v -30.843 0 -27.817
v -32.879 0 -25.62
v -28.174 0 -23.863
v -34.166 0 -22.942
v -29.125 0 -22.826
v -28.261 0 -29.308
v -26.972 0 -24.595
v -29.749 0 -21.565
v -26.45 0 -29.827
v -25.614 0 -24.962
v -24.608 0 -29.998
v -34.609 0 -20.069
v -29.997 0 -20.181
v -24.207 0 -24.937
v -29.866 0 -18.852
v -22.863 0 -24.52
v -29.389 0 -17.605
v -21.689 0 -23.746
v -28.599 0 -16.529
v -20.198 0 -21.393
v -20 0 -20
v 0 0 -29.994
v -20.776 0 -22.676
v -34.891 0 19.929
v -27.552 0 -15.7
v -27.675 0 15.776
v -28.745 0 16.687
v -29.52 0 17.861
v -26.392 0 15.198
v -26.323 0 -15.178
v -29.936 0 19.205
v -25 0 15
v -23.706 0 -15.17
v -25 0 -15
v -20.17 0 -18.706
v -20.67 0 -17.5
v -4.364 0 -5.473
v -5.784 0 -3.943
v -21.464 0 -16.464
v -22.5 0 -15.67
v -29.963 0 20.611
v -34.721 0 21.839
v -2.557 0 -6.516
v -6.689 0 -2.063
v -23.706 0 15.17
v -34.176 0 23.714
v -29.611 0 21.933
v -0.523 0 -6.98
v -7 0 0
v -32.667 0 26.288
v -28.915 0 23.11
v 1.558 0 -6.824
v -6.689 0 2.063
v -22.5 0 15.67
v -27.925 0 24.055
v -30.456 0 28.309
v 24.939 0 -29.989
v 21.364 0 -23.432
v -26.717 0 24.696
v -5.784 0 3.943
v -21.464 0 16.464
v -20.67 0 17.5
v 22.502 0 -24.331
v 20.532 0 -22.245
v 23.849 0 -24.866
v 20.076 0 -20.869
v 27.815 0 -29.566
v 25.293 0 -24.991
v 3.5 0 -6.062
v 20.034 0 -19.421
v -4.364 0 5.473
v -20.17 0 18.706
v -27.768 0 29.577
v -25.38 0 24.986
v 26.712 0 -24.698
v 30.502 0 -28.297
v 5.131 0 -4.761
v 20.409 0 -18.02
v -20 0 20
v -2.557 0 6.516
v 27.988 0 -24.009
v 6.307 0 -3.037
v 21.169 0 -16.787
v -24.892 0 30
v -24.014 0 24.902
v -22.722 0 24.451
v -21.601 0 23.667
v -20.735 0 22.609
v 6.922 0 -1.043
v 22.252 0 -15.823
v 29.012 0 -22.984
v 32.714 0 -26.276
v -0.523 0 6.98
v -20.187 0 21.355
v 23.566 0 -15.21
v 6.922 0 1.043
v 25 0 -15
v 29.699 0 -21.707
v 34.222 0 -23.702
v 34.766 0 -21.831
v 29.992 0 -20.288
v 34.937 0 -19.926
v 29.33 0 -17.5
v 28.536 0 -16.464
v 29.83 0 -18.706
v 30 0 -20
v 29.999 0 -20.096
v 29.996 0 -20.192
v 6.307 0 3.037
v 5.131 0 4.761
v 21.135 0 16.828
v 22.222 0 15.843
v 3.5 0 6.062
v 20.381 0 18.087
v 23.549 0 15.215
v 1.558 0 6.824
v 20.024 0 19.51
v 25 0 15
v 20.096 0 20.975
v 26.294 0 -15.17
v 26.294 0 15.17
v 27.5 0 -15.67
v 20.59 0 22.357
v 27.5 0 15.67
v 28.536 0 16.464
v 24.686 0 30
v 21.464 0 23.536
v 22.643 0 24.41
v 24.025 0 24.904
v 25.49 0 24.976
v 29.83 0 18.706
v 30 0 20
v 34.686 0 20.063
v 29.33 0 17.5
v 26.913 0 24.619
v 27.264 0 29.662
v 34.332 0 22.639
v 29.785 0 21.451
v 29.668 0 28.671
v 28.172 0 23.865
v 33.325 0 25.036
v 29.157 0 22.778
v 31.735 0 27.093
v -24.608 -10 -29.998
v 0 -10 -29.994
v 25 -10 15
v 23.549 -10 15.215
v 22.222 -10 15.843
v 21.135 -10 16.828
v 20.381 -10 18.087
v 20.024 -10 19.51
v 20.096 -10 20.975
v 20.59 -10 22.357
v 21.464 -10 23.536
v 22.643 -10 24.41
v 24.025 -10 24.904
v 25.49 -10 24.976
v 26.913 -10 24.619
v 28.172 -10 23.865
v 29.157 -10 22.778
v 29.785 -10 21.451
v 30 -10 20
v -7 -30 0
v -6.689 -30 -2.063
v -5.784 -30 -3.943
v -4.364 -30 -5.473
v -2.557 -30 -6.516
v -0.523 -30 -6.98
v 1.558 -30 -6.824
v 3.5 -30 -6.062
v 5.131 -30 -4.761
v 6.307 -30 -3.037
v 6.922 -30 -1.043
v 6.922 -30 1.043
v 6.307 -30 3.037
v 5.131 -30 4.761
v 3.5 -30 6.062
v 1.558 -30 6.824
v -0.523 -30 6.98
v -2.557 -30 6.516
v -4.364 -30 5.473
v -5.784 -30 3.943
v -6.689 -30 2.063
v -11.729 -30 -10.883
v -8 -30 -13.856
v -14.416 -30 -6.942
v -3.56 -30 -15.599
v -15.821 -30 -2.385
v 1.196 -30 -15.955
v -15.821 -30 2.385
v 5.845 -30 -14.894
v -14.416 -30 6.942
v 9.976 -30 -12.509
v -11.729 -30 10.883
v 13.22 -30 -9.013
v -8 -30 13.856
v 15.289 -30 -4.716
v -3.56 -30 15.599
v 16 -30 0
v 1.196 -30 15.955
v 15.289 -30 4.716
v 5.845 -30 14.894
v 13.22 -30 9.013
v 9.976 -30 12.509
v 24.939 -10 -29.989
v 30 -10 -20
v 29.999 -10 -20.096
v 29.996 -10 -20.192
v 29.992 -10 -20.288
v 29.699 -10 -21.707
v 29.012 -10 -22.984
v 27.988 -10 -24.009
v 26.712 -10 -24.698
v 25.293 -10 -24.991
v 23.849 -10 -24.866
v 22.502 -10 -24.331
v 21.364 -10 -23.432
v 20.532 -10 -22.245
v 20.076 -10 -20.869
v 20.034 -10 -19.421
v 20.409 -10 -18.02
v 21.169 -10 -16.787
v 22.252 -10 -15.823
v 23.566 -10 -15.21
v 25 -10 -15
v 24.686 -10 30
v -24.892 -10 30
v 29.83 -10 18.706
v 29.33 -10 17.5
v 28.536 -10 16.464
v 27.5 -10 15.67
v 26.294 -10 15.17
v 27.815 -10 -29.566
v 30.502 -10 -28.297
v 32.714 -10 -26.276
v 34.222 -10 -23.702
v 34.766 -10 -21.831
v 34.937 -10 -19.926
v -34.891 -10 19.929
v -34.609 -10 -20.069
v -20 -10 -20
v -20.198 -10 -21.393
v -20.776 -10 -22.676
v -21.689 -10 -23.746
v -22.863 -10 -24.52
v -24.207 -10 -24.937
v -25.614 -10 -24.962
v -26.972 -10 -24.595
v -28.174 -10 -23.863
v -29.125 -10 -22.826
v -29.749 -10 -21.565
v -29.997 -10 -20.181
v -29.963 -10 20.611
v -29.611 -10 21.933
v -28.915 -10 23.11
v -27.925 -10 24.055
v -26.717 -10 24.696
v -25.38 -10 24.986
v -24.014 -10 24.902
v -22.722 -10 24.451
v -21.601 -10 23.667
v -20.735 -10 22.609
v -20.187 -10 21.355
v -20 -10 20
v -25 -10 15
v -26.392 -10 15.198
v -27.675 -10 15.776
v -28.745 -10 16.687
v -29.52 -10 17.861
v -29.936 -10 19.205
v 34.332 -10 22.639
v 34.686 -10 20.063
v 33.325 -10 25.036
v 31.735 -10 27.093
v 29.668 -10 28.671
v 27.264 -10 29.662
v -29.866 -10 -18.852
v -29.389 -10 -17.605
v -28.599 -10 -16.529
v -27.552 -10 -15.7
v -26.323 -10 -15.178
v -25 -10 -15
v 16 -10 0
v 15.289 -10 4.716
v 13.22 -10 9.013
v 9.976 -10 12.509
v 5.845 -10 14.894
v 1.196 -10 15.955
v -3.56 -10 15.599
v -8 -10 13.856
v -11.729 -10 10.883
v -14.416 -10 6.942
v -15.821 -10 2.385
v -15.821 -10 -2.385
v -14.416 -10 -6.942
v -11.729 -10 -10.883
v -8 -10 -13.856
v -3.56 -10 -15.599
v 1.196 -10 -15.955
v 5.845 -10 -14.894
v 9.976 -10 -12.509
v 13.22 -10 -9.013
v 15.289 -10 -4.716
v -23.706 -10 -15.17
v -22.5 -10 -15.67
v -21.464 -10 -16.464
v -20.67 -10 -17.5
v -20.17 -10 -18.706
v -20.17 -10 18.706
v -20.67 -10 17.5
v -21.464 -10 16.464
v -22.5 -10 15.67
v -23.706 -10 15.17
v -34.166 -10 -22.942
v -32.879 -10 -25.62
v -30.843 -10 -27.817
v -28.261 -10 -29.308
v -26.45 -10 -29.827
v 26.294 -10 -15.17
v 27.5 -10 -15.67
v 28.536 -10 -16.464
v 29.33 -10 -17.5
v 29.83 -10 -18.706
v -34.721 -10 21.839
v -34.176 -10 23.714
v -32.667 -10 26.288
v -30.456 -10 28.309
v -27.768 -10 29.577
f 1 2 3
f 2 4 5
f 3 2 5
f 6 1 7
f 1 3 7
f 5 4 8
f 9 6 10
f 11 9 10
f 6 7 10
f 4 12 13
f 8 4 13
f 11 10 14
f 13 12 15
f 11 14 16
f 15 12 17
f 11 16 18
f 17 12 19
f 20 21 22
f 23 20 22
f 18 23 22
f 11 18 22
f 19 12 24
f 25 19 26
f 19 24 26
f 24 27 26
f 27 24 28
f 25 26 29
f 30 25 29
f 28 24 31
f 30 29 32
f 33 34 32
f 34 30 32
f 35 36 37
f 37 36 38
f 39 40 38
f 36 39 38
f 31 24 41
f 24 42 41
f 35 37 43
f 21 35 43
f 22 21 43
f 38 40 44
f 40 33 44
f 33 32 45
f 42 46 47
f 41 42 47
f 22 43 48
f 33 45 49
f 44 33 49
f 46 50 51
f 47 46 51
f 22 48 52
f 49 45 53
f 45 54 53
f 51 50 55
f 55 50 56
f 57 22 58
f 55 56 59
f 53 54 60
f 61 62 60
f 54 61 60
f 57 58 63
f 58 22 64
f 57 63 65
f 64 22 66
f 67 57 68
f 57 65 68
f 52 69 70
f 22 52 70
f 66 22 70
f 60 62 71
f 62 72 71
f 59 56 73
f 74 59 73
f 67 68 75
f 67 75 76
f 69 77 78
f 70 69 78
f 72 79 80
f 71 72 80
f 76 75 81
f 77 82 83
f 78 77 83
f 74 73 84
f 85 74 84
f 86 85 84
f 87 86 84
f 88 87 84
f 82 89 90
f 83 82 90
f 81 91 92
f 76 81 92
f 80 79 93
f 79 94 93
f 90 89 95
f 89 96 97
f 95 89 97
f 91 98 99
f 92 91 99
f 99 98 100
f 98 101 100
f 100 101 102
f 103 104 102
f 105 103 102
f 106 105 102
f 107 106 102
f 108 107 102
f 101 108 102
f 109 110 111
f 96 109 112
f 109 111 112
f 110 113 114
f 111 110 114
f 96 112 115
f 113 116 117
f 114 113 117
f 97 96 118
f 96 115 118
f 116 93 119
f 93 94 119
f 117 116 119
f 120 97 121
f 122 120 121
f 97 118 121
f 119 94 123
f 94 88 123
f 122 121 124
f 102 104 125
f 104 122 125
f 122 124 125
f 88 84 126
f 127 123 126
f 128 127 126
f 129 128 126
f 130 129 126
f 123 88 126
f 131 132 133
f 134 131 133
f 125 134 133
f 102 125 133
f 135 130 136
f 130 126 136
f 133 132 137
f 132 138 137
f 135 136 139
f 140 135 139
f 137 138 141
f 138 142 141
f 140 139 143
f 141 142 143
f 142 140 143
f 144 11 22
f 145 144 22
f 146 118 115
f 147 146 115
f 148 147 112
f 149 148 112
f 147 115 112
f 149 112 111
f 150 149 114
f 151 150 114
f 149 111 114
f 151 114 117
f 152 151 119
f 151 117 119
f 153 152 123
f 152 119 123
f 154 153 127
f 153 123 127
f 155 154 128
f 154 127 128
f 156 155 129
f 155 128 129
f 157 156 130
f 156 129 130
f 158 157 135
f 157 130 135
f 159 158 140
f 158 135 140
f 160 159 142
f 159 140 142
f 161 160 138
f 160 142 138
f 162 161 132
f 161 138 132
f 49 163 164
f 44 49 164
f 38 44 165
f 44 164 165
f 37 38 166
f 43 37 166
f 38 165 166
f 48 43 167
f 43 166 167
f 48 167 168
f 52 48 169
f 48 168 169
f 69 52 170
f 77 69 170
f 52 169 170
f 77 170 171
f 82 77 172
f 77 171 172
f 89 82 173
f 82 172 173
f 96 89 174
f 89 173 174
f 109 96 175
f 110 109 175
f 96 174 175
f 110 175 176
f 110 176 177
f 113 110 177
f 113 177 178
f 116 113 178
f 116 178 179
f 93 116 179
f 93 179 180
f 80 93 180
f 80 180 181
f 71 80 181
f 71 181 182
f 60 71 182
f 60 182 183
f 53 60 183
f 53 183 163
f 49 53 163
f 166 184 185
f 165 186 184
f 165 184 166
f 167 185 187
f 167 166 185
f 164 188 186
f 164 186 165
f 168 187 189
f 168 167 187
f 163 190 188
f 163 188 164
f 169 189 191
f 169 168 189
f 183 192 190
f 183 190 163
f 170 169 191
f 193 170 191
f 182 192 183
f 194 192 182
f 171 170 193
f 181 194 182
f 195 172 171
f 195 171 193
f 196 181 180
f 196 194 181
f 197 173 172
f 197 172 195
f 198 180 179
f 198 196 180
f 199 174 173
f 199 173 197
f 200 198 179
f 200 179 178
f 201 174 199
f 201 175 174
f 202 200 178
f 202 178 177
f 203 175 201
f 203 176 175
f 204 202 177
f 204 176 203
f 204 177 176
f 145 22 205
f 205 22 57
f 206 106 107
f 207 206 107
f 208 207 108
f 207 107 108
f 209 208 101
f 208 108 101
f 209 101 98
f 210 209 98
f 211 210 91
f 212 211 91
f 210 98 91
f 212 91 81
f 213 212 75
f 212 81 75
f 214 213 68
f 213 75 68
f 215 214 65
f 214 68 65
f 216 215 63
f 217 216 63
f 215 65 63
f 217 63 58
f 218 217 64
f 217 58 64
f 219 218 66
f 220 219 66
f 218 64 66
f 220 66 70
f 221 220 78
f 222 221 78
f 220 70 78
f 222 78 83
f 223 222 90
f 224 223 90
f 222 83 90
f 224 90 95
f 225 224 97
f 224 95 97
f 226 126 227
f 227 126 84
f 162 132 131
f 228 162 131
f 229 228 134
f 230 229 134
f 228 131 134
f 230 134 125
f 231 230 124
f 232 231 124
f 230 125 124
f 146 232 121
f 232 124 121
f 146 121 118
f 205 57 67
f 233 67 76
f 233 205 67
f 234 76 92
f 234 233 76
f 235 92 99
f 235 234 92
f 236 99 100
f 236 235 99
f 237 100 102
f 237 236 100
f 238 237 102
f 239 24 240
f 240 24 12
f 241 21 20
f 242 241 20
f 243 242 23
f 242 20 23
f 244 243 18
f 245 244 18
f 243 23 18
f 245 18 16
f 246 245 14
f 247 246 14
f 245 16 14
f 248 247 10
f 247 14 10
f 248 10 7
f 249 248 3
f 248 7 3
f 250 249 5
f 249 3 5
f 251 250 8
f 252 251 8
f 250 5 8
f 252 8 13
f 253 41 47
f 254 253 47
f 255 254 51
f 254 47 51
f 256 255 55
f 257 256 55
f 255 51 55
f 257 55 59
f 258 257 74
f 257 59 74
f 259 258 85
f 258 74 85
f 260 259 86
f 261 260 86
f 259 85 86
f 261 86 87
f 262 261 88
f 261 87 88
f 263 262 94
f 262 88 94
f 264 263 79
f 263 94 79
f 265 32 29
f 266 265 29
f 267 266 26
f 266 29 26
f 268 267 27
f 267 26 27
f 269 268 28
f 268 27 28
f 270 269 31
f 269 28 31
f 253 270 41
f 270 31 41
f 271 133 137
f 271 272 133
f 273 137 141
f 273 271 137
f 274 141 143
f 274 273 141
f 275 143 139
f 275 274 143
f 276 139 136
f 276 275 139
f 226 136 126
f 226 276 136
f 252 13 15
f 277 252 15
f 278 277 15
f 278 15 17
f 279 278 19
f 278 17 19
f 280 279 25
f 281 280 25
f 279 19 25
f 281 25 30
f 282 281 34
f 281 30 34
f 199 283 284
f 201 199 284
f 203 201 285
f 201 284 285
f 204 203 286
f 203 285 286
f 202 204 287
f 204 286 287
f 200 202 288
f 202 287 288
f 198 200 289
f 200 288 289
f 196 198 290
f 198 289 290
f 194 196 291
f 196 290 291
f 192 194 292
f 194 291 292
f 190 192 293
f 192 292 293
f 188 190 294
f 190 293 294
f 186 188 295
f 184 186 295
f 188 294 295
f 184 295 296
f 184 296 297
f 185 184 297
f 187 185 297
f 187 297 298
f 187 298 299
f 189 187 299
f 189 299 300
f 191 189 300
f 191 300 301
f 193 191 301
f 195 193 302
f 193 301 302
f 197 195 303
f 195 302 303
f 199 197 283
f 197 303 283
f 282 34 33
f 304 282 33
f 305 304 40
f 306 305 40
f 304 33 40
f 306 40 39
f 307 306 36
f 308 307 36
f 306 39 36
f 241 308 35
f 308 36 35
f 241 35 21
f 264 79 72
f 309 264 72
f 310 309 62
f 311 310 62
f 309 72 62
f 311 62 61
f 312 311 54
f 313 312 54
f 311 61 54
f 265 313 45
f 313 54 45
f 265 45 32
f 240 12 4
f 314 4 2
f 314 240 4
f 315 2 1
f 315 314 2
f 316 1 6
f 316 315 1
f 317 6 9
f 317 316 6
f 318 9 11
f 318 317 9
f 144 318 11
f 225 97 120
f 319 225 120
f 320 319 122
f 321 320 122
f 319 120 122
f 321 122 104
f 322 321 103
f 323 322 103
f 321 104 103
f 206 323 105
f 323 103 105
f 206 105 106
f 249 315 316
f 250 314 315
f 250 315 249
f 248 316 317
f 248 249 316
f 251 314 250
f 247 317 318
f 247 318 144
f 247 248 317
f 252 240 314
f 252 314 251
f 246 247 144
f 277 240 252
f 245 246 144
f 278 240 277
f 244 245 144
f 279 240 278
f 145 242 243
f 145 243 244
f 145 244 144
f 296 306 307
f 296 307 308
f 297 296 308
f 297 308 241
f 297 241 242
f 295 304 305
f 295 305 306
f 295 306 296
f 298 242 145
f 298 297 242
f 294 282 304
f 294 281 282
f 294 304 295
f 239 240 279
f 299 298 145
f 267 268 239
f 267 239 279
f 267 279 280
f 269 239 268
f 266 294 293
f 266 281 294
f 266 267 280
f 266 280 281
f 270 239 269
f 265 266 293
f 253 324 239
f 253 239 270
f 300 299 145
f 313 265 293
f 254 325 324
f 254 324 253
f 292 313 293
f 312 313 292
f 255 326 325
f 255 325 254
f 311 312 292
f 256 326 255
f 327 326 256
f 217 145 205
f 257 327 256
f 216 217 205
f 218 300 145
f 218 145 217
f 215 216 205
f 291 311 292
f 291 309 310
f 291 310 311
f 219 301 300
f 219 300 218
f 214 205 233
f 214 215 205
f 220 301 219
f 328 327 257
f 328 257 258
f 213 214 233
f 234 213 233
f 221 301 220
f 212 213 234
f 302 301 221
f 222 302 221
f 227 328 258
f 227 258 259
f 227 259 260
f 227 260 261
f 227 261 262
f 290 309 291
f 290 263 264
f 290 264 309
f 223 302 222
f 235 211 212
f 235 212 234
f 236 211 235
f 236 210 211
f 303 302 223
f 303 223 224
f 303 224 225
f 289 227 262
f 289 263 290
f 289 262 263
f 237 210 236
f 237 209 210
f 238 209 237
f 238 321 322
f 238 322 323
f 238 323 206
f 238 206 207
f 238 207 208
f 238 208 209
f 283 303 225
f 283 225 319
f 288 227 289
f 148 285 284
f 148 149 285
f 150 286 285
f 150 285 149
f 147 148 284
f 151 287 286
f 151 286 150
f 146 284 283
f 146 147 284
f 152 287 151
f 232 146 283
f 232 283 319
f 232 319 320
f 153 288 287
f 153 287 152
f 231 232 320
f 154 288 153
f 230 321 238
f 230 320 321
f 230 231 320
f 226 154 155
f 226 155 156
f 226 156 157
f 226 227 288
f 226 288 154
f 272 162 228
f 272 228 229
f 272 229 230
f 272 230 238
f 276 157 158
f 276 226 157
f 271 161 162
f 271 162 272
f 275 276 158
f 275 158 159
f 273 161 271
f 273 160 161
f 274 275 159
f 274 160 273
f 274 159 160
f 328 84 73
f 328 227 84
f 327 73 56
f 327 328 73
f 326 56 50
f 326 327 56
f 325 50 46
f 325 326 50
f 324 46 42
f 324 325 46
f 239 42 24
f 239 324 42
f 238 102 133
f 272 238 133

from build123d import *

# Parameters (mm, degrees)
F1_DEPTH = 10
F2_R     = 10
F3_R     = 16
F4_DEPTH = 20
F5_D     = 14
F5_DEPTH = 31
F5_TIP   = 4.2060243332


with BuildPart() as f1:
    # F0 (on Front) → F1 (new body)
    with BuildSketch(Plane.XZ):
        with BuildLine():
            ThreePointArc((-16, 0), (-11.313708499, 11.313708499), (0, 16))
            Line((0, 16), (0, 30))
            Line((0, 30), (-34.9625474322, 30))
            Line((-34.9625474322, 30), (-34.8962779592, 20.6108379355))
            Line((-34.8962779592, 20.6108379355), (-29.9625474322, 20.6108379355))
            ThreePointArc((-29.9625474322, 20.6108379355), (-24.6940074845, 24.9906280747), (-20, 20))
            ThreePointArc((-20, 20), (-21.4644660941, 16.4644660941), (-25, 15))
            Line((-25, 15), (-25, 0))
            Line((-25, 0), (-16, 0))
        make_face()
        with BuildLine():
            ThreePointArc((0, 16), (11.313708499, 11.313708499), (16, 0))
            Line((16, 0), (25, 0))
            Line((25, 0), (25, 15))
            ThreePointArc((25, 15), (21.4644660941, 23.5355339059), (30, 20))
            Line((30, 20), (34.6863753932, 20))
            Line((34.6863753932, 20), (34.6236340702, 30))
            Line((34.6236340702, 30), (0, 30))
            Line((0, 30), (0, 16))
        make_face()
        with BuildLine():
            Line((25, 0), (16, 0))
            ThreePointArc((16, 0), (11.313708499, -11.313708499), (0, -16))
            Line((0, -16), (0, -29.9935078941))
            Line((0, -29.9935078941), (35, -29.9869291484))
            Line((35, -29.9869291484), (34.9391447048, -20.2875329247))
            Line((34.9391447048, -20.2875329247), (29.9917256352, -20.2875329247))
            ThreePointArc((29.9917256352, -20.2875329247), (21.3642287872, -23.432370564), (25, -15))
            Line((25, -15), (25, 0))
        make_face()
        with BuildLine():
            Line((0, -29.9935078941), (0, -16))
            ThreePointArc((0, -16), (-11.313708499, -11.313708499), (-16, 0))
            Line((-16, 0), (-25, 0))
            Line((-25, 0), (-25, -15))
            ThreePointArc((-25, -15), (-21.4644660941, -16.4644660941), (-20, -20))
            ThreePointArc((-20, -20), (-24.9096942239, -24.9991844202), (-29.9967379467, -20.1805820915))
            Line((-29.9967379467, -20.1805820915), (-34.6083687837, -20.1805820915))
            Line((-34.6083687837, -20.1805820915), (-34.5390625298, -30))
            Line((-34.5390625298, -30), (0, -29.9935078941))
        make_face()
        with BuildLine():
            Line((-25, -15), (-25, 0))
            Line((-25, 0), (-25, 15))
            ThreePointArc((-25, 15), (-28.7452763368, 16.6874624287), (-29.9625474322, 20.6108379355))
            Line((-29.9625474322, 20.6108379355), (-34.8962779592, 20.6108379355))
            Line((-34.8962779592, 20.6108379355), (-34.6083687837, -20.1805820915))
            Line((-34.6083687837, -20.1805820915), (-29.9967379467, -20.1805820915))
            ThreePointArc((-29.9967379467, -20.1805820915), (-28.5988130305, -16.5288986227), (-25, -15))
        make_face()
        with BuildLine():
            Line((25, 15), (25, 0))
            Line((25, 0), (25, -15))
            ThreePointArc((25, -15), (28.5355339059, -16.4644660941), (30, -20))
            ThreePointArc((30, -20), (29.9979309807, -20.1438259781), (29.9917256352, -20.2875329247))
            Line((29.9917256352, -20.2875329247), (34.9391447048, -20.2875329247))
            Line((34.9391447048, -20.2875329247), (34.6863753932, 20))
            Line((34.6863753932, 20), (30, 20))
            ThreePointArc((30, 20), (28.5355339059, 16.4644660941), (25, 15))
        make_face()
        with BuildLine():
            ThreePointArc((-16, 0), (-11.313708499, -11.313708499), (0, -16))
            Line((0, -16), (0, 0))
            Line((0, 0), (-16, 0))
        make_face()
        with BuildLine():
            Line((0, 0), (0, 16))
            ThreePointArc((0, 16), (-11.313708499, 11.313708499), (-16, 0))
            Line((-16, 0), (0, 0))
        make_face()
        with BuildLine():
            Line((0, 0), (16, 0))
            ThreePointArc((16, 0), (11.313708499, 11.313708499), (0, 16))
            Line((0, 16), (0, 0))
        make_face()
        with BuildLine():
            ThreePointArc((0, -16), (11.313708499, -11.313708499), (16, 0))
            Line((16, 0), (0, 0))
            Line((0, 0), (0, -16))
        make_face()
    extrude(amount=F1_DEPTH)

    # F2
    f2_edges = [f1.edges().sort_by_distance(p)[0] for p in [
        (34.623634, -5, 30),
        (-34.962547, -5, 30),
        (35, -5, -29.986929),
        (-34.539063, -5, -30),
    ]]
    fillet(f2_edges, radius=F2_R)

    # F3 (on face) → F4 (join)
    with BuildSketch(Plane.XZ.offset(10)):
        Circle(F3_R)
    extrude(amount=F4_DEPTH)

    # F5
    with Locations(Plane(origin=(0, 0, 0), x_dir=(1, 0, 0), z_dir=(0, 1, 0))):
        with Locations((0, 0)):
            Hole(F5_D / 2, depth=F5_DEPTH)
            with Locations((0, 0, -(F5_DEPTH + F5_TIP / 2))):  # 118° drill point
                Cone(0, F5_D / 2, F5_TIP, mode=Mode.SUBTRACT)


solid = f1.part
